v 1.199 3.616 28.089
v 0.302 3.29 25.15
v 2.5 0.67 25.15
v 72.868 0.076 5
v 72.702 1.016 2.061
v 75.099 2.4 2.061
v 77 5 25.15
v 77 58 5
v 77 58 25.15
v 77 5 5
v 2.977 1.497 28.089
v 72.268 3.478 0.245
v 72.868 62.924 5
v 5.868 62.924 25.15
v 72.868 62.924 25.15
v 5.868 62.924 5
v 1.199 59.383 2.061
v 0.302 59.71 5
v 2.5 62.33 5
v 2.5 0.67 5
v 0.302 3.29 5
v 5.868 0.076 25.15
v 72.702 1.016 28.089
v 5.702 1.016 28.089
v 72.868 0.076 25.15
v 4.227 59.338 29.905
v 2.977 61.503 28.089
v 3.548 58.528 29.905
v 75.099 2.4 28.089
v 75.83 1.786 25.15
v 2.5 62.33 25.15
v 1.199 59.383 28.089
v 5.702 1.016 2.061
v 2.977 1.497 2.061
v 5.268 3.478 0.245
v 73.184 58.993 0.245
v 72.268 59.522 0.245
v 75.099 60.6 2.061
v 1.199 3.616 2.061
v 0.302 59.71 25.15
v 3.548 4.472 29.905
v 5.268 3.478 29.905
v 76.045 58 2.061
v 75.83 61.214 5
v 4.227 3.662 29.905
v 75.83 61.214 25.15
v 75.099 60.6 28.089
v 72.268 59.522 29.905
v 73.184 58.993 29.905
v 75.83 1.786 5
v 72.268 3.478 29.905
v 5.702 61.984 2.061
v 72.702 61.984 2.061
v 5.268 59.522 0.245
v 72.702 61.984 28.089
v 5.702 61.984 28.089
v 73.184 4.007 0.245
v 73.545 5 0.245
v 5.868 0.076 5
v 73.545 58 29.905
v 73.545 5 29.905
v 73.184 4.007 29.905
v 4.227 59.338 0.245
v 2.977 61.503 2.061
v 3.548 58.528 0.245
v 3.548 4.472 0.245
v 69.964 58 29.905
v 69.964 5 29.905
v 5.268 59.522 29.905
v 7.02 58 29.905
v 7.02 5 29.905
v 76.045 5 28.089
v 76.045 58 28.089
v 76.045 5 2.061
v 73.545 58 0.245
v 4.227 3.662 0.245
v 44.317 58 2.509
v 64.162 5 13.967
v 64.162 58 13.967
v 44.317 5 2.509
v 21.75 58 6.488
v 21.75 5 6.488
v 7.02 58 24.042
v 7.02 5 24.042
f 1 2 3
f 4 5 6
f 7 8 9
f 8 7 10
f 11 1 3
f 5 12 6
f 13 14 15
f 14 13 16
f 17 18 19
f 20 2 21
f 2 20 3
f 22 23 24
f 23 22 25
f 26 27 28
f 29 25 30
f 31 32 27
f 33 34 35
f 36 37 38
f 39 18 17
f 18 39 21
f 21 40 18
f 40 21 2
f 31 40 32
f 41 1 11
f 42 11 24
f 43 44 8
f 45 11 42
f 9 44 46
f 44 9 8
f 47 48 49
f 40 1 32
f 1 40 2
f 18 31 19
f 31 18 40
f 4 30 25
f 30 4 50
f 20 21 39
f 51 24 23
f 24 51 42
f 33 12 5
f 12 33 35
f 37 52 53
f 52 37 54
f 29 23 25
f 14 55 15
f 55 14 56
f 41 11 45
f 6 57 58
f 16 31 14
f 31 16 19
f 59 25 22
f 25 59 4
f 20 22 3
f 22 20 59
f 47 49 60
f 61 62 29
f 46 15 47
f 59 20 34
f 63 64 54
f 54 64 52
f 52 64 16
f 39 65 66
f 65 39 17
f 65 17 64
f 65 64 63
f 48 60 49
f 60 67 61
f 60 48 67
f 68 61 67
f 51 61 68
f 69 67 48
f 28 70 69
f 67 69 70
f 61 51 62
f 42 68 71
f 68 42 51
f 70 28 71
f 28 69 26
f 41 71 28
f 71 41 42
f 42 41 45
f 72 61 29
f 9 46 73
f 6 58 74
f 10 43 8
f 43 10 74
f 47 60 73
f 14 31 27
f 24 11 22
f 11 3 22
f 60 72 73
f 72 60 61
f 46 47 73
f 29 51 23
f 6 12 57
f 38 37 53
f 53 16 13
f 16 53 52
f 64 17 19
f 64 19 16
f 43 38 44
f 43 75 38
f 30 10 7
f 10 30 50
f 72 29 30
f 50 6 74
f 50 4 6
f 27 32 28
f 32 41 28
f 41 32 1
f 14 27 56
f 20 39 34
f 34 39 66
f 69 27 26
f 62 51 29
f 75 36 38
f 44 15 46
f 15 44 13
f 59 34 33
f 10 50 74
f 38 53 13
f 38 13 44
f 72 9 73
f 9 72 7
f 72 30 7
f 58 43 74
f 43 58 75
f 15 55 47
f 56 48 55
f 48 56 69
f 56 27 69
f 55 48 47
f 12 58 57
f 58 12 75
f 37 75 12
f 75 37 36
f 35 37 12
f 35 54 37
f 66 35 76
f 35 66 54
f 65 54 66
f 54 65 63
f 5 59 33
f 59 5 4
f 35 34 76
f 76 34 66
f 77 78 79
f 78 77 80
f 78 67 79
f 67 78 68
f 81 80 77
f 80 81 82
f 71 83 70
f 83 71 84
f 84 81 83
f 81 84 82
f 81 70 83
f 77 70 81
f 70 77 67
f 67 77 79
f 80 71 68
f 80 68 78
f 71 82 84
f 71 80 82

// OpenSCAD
//$fn=90; // Make things more round for export
$fn=9; // Renders faster for dev

caster_diam = 67; //actually measures 65mm
caster_width = 53; //actually measures 51mm

chock_cyl_pad = 5;
chock_floor_pad = 2;

chock_x = caster_diam + (chock_cyl_pad * 2);
chock_y = caster_width + (chock_cyl_pad * 2);
chock_height = caster_diam * 0.45;

difference()
{
	rounded_cube([chock_x, chock_y, chock_height], chock_cyl_pad);
	translate([chock_x/2, chock_cyl_pad, (caster_diam / 2) + chock_floor_pad])
	{
		rotate([-90,0,0])
		#cylinder(h=caster_width, d=caster_diam);
	}
}


module rounded_cube(vector, rounded_rad=1)
{
	let(x = vector[0]-(2*rounded_rad), y = vector[1]-(2*rounded_rad), z = vector[2]-(2*rounded_rad))
	{
		hull()
		{
			translate([rounded_rad, rounded_rad, rounded_rad])
			{
				sphere(r=rounded_rad);
				
				translate([x, 0, 0])
				sphere(r=rounded_rad);
				
				translate([0, y, 0])
				sphere(r=rounded_rad);
				
				translate([0, 0, z])
				sphere(r=rounded_rad);
				
				
				translate([x, y, 0])
				sphere(r=rounded_rad);
				
				translate([0, y, z])
				sphere(r=rounded_rad);
				
				translate([x, 0, z])
				sphere(r=rounded_rad);
				
				translate([x, y, z])
				sphere(r=rounded_rad);
			}
		}
	}
}
